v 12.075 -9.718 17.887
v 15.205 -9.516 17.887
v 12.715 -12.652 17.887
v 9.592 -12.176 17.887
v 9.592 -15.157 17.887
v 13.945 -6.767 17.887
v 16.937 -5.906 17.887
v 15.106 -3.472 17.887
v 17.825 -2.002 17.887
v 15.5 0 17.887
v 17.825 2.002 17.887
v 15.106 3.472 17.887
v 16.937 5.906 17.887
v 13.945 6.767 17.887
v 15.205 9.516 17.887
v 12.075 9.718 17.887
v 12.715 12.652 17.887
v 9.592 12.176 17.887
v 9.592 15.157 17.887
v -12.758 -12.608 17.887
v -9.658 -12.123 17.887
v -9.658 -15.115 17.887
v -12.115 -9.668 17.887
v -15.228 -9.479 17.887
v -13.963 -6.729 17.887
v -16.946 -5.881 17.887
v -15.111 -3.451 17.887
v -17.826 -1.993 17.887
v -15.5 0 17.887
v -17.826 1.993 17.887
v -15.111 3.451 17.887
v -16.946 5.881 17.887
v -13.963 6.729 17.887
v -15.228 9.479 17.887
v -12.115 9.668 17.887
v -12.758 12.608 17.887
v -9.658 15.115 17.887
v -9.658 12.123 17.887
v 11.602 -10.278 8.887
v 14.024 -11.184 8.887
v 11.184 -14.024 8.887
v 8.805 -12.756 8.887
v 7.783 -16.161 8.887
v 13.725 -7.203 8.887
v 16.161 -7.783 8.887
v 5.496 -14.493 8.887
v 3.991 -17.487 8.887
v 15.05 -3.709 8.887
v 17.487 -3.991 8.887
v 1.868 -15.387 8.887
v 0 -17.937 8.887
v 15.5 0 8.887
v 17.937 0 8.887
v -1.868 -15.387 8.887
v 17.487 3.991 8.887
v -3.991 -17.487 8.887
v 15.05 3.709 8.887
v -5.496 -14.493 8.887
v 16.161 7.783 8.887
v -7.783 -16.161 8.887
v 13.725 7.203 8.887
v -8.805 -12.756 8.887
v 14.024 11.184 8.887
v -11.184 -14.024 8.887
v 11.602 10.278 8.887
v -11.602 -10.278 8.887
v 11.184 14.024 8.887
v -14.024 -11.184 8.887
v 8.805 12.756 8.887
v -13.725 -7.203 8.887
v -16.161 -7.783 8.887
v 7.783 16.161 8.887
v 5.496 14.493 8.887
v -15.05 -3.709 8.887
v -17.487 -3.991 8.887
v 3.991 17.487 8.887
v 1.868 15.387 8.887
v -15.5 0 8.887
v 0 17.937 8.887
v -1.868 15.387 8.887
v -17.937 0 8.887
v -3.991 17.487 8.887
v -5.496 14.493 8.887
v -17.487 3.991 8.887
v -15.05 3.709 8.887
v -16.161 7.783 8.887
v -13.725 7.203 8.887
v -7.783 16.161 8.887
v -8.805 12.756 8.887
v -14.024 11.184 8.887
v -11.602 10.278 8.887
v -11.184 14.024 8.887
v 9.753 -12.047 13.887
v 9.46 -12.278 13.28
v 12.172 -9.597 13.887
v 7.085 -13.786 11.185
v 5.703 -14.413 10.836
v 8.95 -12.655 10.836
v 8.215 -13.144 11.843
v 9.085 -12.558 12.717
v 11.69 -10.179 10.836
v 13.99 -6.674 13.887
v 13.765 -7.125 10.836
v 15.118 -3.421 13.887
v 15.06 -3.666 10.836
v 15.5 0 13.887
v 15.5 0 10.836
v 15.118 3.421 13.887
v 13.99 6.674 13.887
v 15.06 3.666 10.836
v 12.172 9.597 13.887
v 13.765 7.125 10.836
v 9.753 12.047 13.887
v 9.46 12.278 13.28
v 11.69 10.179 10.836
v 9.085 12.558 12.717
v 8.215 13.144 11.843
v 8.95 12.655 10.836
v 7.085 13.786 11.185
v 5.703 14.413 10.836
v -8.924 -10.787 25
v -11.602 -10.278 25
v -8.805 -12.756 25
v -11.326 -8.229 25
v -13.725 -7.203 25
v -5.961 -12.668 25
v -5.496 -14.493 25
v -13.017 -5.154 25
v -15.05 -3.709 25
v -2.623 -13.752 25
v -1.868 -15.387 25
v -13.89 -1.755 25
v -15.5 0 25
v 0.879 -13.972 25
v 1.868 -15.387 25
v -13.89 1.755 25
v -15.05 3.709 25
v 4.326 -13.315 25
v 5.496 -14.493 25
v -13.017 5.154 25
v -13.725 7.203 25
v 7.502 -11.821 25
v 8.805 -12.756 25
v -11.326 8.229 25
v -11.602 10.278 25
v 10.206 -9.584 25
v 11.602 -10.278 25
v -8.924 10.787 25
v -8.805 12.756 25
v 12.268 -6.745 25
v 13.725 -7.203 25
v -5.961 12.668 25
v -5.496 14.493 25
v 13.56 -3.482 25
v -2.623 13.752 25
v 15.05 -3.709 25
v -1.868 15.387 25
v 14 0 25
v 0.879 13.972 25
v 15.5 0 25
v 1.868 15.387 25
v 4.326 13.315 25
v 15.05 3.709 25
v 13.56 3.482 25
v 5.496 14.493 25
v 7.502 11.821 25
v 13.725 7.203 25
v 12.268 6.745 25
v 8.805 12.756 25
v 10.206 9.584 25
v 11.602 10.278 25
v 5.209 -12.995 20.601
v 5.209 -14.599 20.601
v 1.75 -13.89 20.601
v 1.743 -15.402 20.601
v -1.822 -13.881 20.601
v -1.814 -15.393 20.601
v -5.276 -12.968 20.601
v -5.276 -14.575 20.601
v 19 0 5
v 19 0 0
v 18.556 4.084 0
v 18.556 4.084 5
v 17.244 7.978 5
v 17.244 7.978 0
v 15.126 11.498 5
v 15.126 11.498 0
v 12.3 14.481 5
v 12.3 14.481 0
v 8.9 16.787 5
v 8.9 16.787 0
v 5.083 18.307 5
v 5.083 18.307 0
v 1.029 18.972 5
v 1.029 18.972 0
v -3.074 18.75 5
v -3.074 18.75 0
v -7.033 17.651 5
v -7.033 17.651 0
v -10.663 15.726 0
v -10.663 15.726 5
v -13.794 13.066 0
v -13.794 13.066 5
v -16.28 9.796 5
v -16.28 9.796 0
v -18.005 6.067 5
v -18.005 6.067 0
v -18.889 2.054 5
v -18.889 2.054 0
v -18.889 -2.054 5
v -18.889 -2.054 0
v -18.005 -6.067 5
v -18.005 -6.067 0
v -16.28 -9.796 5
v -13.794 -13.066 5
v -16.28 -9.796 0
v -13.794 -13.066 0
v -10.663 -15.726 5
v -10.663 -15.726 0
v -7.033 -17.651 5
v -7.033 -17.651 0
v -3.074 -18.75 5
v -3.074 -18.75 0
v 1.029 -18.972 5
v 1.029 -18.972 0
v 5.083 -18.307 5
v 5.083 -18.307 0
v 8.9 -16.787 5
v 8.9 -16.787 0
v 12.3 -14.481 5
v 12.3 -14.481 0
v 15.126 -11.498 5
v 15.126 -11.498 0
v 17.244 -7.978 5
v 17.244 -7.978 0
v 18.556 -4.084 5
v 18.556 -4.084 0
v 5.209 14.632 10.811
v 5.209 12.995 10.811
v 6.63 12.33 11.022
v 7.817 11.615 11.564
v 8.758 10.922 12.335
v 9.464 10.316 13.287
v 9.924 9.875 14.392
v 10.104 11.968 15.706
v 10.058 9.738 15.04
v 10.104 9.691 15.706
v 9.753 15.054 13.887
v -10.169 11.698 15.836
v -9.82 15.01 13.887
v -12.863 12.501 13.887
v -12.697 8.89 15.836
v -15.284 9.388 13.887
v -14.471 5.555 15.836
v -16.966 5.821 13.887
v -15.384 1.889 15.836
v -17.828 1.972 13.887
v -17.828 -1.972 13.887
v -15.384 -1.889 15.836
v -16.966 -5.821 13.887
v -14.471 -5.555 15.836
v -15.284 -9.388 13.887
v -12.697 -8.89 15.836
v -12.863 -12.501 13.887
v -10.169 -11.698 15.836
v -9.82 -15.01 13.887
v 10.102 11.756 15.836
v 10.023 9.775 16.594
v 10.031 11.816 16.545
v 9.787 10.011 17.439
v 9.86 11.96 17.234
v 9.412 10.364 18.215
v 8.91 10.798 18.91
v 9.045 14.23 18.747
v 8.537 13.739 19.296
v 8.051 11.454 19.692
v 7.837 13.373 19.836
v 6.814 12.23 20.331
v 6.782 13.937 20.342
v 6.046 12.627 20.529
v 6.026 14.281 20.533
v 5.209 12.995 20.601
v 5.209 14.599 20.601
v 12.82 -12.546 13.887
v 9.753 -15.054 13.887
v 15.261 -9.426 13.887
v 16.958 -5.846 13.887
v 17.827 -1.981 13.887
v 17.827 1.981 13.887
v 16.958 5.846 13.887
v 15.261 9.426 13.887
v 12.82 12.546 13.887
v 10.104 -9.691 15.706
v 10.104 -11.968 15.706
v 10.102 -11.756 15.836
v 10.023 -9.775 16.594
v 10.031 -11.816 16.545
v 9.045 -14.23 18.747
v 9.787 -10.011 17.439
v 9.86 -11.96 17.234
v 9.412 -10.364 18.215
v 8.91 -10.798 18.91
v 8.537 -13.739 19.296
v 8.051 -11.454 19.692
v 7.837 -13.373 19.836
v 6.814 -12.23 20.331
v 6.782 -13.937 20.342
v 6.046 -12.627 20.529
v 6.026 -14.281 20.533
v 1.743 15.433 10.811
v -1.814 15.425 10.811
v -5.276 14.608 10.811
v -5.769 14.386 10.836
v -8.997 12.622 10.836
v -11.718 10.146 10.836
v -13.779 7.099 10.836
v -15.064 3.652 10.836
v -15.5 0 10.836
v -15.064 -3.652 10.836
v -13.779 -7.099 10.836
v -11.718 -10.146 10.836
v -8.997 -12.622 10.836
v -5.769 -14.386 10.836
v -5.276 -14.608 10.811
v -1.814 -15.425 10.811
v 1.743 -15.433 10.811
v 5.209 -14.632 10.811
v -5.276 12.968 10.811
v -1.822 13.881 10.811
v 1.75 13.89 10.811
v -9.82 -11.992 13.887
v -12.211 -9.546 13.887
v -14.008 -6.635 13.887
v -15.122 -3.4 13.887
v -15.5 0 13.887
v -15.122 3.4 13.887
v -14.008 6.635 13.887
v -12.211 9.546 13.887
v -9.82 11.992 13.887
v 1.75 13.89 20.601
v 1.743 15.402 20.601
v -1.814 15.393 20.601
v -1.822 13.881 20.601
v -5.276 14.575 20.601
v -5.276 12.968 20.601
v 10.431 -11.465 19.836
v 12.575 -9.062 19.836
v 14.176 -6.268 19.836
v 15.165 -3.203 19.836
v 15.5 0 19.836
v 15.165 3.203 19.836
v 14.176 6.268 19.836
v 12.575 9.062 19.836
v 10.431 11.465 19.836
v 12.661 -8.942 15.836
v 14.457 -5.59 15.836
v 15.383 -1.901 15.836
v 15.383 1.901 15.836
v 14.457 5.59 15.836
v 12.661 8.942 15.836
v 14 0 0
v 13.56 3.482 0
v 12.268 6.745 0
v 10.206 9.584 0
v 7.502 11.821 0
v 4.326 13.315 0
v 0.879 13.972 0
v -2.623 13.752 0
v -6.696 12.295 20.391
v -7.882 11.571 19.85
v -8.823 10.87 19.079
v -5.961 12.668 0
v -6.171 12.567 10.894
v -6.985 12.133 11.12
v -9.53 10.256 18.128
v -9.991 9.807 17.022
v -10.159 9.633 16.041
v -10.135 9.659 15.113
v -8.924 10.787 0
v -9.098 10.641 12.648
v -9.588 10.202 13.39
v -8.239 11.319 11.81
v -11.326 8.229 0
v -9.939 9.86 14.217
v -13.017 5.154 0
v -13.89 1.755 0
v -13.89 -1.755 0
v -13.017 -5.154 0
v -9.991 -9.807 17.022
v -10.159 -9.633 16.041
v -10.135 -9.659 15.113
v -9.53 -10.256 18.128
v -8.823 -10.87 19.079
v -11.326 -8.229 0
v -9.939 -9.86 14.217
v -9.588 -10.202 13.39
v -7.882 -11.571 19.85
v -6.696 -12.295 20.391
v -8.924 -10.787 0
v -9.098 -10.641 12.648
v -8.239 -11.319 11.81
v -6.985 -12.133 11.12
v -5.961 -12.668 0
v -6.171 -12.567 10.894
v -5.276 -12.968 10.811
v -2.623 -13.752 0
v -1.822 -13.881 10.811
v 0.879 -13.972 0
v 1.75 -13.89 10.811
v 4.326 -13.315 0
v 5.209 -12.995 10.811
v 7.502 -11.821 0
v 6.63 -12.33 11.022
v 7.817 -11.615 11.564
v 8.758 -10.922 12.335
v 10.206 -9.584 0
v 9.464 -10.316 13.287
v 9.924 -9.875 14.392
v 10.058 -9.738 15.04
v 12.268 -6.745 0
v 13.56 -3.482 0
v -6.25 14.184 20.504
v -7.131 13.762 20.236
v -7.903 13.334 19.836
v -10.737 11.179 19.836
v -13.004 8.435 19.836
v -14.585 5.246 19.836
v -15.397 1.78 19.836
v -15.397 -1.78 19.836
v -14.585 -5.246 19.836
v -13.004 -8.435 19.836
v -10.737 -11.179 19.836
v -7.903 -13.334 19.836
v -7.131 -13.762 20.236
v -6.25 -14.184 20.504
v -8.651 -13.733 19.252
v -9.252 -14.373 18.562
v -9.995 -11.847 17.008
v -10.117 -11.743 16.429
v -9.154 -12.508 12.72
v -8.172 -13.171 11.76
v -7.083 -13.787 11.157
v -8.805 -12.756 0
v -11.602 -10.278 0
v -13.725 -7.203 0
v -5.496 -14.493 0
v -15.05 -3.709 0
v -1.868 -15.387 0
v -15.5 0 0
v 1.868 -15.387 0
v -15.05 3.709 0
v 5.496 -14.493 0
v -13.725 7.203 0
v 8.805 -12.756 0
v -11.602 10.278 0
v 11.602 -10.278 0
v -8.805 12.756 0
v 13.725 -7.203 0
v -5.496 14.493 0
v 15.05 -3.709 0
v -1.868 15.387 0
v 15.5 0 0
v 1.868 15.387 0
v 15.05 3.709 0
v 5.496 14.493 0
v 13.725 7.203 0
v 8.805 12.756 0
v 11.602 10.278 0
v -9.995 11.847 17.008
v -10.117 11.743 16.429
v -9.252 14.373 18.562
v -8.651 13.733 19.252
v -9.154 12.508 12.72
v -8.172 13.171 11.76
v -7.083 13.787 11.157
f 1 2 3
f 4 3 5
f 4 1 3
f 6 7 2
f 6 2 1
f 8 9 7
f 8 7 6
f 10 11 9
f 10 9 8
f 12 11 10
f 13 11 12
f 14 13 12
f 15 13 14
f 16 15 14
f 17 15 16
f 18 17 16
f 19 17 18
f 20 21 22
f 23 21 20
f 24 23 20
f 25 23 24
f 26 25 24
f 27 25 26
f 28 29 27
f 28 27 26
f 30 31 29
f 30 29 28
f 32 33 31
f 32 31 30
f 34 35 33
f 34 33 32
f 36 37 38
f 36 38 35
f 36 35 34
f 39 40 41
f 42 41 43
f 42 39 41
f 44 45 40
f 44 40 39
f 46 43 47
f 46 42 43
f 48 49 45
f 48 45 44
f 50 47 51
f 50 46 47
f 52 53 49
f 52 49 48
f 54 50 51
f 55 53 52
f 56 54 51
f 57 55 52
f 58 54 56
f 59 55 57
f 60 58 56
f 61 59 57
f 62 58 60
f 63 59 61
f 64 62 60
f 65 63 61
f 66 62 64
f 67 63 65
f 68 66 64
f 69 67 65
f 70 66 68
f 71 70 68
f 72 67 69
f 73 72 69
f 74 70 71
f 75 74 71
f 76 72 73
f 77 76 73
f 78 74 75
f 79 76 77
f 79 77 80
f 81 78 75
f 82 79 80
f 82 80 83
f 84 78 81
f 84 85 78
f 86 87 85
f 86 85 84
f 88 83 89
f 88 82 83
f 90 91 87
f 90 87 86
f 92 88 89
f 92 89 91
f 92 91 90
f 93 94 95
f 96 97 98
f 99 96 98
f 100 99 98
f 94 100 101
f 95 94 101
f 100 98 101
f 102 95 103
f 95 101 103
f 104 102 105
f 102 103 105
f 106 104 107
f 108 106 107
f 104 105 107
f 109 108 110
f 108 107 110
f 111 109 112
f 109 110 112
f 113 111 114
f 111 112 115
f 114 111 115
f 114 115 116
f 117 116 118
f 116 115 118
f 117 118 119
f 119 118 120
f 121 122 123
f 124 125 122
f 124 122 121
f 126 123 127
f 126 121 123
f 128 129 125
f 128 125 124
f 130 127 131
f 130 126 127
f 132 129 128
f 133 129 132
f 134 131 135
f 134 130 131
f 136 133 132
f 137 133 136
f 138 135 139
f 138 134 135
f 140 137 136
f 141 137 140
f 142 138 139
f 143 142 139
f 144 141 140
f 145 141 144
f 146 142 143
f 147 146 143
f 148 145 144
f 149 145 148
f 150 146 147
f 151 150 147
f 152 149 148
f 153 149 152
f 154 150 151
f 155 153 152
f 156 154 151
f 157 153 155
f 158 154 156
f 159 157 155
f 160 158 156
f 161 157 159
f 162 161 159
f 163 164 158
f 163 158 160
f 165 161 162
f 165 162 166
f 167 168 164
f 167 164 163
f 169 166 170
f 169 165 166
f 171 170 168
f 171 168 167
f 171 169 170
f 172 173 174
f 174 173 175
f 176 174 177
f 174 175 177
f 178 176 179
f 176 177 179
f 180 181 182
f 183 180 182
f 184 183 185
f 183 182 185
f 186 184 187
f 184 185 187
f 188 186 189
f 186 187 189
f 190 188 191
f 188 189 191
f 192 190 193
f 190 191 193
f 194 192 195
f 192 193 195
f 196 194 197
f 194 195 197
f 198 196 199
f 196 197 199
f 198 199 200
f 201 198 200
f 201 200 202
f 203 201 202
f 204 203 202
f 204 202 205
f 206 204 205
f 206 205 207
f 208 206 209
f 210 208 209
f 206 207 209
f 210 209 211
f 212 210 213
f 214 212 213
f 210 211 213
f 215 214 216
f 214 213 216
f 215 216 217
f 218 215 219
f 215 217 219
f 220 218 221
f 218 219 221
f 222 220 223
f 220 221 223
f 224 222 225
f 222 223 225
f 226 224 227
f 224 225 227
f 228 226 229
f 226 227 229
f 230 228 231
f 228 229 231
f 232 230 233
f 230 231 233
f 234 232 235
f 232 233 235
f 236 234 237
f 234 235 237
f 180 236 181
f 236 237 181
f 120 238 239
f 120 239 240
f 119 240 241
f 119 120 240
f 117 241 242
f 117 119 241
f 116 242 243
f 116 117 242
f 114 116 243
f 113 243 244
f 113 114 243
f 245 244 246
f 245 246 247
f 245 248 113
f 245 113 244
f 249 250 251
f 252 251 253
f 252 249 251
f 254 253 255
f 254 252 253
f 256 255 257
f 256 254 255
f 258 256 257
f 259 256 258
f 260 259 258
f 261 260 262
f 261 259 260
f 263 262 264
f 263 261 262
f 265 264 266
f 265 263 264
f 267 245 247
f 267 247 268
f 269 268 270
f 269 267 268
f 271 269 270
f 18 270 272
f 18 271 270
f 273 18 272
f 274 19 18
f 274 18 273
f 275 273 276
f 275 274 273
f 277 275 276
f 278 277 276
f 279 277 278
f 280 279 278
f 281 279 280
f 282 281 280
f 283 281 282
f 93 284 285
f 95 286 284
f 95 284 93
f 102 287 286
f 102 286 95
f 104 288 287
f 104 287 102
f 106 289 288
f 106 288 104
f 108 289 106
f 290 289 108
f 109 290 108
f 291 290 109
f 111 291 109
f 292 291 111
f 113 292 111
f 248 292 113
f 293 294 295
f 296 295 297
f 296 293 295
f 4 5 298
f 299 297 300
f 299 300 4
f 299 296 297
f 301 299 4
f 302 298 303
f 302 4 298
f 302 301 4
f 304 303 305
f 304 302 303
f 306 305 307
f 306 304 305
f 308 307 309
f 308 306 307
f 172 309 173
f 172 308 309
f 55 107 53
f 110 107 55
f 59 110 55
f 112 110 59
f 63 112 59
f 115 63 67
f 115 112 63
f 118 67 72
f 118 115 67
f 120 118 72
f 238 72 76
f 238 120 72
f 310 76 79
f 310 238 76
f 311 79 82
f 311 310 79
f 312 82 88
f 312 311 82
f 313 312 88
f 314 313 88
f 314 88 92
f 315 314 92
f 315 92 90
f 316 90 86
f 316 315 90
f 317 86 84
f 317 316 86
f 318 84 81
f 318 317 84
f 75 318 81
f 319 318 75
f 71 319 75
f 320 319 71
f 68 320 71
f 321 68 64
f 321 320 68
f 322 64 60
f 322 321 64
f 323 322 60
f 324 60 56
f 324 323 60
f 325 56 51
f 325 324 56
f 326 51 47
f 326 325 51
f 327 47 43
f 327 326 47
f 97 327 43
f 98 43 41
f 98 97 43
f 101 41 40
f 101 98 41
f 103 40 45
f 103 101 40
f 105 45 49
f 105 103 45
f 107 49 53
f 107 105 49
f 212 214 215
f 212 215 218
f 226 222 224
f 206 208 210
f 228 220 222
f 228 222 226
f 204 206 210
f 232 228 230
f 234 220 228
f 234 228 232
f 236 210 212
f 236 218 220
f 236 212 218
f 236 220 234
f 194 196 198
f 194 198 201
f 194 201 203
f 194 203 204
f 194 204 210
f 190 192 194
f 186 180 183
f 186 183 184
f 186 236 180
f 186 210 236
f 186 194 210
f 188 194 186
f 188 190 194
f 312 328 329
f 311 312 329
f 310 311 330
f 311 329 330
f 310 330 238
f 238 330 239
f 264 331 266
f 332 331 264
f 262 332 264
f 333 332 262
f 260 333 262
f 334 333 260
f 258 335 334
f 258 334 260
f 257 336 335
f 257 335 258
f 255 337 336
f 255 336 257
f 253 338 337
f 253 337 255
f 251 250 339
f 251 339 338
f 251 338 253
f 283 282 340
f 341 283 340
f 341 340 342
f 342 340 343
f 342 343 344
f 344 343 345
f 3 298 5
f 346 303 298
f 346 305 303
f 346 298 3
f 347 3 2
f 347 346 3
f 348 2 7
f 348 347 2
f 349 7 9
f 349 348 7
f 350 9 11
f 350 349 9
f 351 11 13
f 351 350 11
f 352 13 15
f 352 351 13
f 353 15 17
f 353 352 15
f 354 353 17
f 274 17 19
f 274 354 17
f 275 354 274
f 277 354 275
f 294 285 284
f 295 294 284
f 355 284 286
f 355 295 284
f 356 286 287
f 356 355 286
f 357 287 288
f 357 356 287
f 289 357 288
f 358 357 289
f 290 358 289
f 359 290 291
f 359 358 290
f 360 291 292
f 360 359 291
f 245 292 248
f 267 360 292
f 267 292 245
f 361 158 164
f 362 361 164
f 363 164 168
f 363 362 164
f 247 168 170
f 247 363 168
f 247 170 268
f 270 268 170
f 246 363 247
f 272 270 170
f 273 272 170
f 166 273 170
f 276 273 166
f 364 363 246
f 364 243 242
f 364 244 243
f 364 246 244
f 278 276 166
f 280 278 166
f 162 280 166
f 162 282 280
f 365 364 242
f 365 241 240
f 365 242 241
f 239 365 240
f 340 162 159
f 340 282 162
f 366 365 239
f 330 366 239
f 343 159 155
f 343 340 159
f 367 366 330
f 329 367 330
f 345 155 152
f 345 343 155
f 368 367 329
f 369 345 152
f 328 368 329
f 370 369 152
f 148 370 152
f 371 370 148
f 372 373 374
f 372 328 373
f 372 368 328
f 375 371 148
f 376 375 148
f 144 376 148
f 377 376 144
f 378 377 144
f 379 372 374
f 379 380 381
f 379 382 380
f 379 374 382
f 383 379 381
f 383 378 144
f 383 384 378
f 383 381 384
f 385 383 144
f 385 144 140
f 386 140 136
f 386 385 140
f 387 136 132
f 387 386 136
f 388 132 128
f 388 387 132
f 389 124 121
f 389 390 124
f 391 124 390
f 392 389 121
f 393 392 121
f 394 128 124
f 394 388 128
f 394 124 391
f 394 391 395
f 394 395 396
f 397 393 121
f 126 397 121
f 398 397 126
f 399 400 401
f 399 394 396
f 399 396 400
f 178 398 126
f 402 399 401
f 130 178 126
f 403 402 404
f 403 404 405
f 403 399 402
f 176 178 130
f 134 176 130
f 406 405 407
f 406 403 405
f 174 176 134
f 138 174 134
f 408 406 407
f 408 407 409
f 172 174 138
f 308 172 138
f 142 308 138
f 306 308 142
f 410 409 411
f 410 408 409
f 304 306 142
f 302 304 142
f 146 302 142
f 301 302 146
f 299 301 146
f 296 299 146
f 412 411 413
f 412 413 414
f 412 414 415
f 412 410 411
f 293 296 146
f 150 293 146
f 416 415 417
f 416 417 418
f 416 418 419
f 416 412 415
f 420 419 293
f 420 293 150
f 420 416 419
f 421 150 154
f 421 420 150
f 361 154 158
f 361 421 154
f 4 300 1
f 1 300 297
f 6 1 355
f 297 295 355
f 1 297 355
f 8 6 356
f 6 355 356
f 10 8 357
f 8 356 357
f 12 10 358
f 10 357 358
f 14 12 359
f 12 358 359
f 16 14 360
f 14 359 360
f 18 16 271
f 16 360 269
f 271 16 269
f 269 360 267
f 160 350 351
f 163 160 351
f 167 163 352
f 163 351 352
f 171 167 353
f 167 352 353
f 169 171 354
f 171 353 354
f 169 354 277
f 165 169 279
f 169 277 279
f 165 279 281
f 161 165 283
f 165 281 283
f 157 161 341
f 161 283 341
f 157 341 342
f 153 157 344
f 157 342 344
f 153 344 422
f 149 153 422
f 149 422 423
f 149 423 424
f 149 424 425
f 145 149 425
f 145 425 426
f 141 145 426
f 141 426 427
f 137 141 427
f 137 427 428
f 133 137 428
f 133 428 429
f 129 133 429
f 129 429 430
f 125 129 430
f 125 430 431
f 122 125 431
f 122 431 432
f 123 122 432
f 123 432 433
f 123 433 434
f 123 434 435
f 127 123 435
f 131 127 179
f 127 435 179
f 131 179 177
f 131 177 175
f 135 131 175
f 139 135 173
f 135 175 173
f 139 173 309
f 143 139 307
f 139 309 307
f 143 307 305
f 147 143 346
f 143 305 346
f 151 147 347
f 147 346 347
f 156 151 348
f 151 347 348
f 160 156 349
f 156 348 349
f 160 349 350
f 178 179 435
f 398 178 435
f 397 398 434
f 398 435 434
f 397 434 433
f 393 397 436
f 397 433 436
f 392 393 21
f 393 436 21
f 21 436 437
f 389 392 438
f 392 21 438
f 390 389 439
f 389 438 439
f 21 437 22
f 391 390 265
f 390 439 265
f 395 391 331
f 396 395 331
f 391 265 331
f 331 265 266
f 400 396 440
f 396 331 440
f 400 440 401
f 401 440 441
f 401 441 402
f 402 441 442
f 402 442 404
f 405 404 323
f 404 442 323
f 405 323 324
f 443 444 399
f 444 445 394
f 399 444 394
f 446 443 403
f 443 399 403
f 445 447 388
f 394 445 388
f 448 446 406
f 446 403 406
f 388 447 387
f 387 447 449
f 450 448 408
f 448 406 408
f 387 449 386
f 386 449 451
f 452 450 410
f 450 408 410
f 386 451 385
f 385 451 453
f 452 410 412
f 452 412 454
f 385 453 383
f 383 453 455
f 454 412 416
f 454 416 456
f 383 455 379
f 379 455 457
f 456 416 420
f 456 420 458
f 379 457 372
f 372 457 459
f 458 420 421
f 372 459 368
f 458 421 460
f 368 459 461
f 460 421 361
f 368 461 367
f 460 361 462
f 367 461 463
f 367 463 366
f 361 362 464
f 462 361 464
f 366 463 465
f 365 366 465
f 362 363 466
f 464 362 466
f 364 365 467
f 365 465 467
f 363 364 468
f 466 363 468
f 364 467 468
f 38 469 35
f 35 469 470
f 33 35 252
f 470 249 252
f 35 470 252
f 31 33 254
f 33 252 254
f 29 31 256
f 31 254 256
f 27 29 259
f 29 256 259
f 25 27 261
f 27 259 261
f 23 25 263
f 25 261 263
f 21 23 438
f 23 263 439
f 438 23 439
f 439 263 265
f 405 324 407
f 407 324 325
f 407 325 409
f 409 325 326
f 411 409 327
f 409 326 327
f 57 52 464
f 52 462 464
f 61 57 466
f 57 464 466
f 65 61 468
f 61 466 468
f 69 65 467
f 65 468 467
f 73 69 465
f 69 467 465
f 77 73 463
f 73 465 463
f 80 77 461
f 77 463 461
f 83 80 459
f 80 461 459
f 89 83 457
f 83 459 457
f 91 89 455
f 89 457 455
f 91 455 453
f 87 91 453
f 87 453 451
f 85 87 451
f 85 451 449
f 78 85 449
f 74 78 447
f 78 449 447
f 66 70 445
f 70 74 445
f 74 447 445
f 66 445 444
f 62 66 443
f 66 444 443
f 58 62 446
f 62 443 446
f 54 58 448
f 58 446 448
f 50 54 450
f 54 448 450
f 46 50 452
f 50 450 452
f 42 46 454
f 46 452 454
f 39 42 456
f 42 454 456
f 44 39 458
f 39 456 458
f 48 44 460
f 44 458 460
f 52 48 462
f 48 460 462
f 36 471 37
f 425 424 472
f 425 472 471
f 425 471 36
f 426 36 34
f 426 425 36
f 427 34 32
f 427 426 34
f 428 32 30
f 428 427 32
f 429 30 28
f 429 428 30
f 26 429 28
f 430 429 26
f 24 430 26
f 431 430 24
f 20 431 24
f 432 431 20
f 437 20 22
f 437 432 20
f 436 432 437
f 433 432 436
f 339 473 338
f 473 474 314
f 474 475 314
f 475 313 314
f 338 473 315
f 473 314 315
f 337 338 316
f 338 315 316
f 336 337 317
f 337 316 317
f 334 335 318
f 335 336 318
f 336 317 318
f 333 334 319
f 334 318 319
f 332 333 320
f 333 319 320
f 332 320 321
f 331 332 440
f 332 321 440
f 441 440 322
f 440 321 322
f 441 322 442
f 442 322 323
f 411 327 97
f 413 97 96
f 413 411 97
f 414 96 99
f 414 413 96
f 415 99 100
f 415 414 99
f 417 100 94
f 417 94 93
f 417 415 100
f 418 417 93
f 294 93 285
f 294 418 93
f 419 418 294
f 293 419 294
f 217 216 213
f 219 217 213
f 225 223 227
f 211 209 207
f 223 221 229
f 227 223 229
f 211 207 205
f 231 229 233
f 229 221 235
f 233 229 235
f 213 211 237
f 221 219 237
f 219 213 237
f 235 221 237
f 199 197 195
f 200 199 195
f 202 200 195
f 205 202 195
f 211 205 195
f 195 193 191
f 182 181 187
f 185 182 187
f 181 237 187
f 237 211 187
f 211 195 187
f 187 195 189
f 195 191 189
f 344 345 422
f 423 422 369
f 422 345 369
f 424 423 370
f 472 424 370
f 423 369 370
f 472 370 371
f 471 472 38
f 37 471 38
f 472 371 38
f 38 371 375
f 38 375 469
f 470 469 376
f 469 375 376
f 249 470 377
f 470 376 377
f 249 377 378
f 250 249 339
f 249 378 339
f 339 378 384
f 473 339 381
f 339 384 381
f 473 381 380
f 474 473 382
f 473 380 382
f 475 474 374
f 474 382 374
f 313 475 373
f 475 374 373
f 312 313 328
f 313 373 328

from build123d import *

# Parameters (mm, degrees)
F0_R     = 19
F0_R_2   = 15.5
F0_R_3   = 14
F1_DEPTH = 5
F2_DEPTH = 25
F6_DEPTH = 25


with BuildPart() as f1:
    # F0 (on Top) → F1 (new body)
    with BuildSketch(Plane.XY):
        Circle(F0_R)
        Circle(F0_R_2, mode=Mode.SUBTRACT)
        Circle(F0_R_2)
        Circle(F0_R_3, mode=Mode.SUBTRACT)
        Circle(F0_R_3)
    extrude(amount=F1_DEPTH)


with BuildPart() as f2:
    # F0 (on Top) → F2 (new body)
    with BuildSketch(Plane.XY):
        Circle(F0_R_2)
        Circle(F0_R_3, mode=Mode.SUBTRACT)
    extrude(amount=F2_DEPTH)

    # F3 (on Front) → F4 (revolve)
    with BuildSketch(Plane.XZ):
        Polygon((17.9371413716, 13.8867036179), (15.4371413716, 15.8867036179), (15.4371413716, 13.8867036179), align=None)
        Polygon((17.9371413716, 17.8867037556), (15.4371413716, 19.8867037556), (15.4371413716, 17.8867037556), align=None)
        Polygon((17.9371413716, 8.8867037271), (15.4371413716, 10.8867037271), (15.4371413716, 8.8867037271), align=None)
    revolve(axis=Axis((0, 0, 18.7137275934), (0, 0, 1)))


with BuildPart() as f6:
    # F5 (on Front) → F6 (new body, symmetric)
    with BuildSketch(Plane.XZ):
        with BuildLine():
            ThreePointArc((-5.2757132798, 10.8114516745), (-1.8144269488, 12.2451634161), (-0.3807152072, 15.7064497471))
            ThreePointArc((-0.3807152072, 15.7064497471), (-1.8144269488, 19.1677360781), (-5.2757132798, 20.6014478197))
            ThreePointArc((-5.2757132798, 20.6014478197), (-10.1707113524, 15.7064497471), (-5.2757132798, 10.8114516745))
        make_face()
        with BuildLine():
            ThreePointArc((10.1039001336, 15.7064497471), (8.670188392, 19.1677360781), (5.208902061, 20.6014478197))
            ThreePointArc((5.208902061, 20.6014478197), (0.3139039884, 15.7064497471), (5.208902061, 10.8114516745))
            ThreePointArc((5.208902061, 10.8114516745), (8.670188392, 12.2451634161), (10.1039001336, 15.7064497471))
        make_face()
        with BuildLine():
            ThreePointArc((-5.2757132798, 20.6014478197), (-1.8144269488, 19.1677360781), (-0.3807152072, 15.7064497471))
            ThreePointArc((-0.3807152072, 15.7064497471), (-1.8144269488, 12.2451634161), (-5.2757132798, 10.8114516745))
            Line((-5.2757132798, 10.8114516745), (5.208902061, 10.8114516745))
            ThreePointArc((5.208902061, 10.8114516745), (0.3139039884, 15.7064497471), (5.208902061, 20.6014478197))
            Line((5.208902061, 20.6014478197), (-5.2757132798, 20.6014478197))
        make_face()
    extrude(amount=F6_DEPTH, both=True)


with BuildPart() as f2_1:
    add(f2.part)

    # F7: cut F6
    add(f6.part, mode=Mode.SUBTRACT)


solid = Compound([f1.part, f2_1.part])
